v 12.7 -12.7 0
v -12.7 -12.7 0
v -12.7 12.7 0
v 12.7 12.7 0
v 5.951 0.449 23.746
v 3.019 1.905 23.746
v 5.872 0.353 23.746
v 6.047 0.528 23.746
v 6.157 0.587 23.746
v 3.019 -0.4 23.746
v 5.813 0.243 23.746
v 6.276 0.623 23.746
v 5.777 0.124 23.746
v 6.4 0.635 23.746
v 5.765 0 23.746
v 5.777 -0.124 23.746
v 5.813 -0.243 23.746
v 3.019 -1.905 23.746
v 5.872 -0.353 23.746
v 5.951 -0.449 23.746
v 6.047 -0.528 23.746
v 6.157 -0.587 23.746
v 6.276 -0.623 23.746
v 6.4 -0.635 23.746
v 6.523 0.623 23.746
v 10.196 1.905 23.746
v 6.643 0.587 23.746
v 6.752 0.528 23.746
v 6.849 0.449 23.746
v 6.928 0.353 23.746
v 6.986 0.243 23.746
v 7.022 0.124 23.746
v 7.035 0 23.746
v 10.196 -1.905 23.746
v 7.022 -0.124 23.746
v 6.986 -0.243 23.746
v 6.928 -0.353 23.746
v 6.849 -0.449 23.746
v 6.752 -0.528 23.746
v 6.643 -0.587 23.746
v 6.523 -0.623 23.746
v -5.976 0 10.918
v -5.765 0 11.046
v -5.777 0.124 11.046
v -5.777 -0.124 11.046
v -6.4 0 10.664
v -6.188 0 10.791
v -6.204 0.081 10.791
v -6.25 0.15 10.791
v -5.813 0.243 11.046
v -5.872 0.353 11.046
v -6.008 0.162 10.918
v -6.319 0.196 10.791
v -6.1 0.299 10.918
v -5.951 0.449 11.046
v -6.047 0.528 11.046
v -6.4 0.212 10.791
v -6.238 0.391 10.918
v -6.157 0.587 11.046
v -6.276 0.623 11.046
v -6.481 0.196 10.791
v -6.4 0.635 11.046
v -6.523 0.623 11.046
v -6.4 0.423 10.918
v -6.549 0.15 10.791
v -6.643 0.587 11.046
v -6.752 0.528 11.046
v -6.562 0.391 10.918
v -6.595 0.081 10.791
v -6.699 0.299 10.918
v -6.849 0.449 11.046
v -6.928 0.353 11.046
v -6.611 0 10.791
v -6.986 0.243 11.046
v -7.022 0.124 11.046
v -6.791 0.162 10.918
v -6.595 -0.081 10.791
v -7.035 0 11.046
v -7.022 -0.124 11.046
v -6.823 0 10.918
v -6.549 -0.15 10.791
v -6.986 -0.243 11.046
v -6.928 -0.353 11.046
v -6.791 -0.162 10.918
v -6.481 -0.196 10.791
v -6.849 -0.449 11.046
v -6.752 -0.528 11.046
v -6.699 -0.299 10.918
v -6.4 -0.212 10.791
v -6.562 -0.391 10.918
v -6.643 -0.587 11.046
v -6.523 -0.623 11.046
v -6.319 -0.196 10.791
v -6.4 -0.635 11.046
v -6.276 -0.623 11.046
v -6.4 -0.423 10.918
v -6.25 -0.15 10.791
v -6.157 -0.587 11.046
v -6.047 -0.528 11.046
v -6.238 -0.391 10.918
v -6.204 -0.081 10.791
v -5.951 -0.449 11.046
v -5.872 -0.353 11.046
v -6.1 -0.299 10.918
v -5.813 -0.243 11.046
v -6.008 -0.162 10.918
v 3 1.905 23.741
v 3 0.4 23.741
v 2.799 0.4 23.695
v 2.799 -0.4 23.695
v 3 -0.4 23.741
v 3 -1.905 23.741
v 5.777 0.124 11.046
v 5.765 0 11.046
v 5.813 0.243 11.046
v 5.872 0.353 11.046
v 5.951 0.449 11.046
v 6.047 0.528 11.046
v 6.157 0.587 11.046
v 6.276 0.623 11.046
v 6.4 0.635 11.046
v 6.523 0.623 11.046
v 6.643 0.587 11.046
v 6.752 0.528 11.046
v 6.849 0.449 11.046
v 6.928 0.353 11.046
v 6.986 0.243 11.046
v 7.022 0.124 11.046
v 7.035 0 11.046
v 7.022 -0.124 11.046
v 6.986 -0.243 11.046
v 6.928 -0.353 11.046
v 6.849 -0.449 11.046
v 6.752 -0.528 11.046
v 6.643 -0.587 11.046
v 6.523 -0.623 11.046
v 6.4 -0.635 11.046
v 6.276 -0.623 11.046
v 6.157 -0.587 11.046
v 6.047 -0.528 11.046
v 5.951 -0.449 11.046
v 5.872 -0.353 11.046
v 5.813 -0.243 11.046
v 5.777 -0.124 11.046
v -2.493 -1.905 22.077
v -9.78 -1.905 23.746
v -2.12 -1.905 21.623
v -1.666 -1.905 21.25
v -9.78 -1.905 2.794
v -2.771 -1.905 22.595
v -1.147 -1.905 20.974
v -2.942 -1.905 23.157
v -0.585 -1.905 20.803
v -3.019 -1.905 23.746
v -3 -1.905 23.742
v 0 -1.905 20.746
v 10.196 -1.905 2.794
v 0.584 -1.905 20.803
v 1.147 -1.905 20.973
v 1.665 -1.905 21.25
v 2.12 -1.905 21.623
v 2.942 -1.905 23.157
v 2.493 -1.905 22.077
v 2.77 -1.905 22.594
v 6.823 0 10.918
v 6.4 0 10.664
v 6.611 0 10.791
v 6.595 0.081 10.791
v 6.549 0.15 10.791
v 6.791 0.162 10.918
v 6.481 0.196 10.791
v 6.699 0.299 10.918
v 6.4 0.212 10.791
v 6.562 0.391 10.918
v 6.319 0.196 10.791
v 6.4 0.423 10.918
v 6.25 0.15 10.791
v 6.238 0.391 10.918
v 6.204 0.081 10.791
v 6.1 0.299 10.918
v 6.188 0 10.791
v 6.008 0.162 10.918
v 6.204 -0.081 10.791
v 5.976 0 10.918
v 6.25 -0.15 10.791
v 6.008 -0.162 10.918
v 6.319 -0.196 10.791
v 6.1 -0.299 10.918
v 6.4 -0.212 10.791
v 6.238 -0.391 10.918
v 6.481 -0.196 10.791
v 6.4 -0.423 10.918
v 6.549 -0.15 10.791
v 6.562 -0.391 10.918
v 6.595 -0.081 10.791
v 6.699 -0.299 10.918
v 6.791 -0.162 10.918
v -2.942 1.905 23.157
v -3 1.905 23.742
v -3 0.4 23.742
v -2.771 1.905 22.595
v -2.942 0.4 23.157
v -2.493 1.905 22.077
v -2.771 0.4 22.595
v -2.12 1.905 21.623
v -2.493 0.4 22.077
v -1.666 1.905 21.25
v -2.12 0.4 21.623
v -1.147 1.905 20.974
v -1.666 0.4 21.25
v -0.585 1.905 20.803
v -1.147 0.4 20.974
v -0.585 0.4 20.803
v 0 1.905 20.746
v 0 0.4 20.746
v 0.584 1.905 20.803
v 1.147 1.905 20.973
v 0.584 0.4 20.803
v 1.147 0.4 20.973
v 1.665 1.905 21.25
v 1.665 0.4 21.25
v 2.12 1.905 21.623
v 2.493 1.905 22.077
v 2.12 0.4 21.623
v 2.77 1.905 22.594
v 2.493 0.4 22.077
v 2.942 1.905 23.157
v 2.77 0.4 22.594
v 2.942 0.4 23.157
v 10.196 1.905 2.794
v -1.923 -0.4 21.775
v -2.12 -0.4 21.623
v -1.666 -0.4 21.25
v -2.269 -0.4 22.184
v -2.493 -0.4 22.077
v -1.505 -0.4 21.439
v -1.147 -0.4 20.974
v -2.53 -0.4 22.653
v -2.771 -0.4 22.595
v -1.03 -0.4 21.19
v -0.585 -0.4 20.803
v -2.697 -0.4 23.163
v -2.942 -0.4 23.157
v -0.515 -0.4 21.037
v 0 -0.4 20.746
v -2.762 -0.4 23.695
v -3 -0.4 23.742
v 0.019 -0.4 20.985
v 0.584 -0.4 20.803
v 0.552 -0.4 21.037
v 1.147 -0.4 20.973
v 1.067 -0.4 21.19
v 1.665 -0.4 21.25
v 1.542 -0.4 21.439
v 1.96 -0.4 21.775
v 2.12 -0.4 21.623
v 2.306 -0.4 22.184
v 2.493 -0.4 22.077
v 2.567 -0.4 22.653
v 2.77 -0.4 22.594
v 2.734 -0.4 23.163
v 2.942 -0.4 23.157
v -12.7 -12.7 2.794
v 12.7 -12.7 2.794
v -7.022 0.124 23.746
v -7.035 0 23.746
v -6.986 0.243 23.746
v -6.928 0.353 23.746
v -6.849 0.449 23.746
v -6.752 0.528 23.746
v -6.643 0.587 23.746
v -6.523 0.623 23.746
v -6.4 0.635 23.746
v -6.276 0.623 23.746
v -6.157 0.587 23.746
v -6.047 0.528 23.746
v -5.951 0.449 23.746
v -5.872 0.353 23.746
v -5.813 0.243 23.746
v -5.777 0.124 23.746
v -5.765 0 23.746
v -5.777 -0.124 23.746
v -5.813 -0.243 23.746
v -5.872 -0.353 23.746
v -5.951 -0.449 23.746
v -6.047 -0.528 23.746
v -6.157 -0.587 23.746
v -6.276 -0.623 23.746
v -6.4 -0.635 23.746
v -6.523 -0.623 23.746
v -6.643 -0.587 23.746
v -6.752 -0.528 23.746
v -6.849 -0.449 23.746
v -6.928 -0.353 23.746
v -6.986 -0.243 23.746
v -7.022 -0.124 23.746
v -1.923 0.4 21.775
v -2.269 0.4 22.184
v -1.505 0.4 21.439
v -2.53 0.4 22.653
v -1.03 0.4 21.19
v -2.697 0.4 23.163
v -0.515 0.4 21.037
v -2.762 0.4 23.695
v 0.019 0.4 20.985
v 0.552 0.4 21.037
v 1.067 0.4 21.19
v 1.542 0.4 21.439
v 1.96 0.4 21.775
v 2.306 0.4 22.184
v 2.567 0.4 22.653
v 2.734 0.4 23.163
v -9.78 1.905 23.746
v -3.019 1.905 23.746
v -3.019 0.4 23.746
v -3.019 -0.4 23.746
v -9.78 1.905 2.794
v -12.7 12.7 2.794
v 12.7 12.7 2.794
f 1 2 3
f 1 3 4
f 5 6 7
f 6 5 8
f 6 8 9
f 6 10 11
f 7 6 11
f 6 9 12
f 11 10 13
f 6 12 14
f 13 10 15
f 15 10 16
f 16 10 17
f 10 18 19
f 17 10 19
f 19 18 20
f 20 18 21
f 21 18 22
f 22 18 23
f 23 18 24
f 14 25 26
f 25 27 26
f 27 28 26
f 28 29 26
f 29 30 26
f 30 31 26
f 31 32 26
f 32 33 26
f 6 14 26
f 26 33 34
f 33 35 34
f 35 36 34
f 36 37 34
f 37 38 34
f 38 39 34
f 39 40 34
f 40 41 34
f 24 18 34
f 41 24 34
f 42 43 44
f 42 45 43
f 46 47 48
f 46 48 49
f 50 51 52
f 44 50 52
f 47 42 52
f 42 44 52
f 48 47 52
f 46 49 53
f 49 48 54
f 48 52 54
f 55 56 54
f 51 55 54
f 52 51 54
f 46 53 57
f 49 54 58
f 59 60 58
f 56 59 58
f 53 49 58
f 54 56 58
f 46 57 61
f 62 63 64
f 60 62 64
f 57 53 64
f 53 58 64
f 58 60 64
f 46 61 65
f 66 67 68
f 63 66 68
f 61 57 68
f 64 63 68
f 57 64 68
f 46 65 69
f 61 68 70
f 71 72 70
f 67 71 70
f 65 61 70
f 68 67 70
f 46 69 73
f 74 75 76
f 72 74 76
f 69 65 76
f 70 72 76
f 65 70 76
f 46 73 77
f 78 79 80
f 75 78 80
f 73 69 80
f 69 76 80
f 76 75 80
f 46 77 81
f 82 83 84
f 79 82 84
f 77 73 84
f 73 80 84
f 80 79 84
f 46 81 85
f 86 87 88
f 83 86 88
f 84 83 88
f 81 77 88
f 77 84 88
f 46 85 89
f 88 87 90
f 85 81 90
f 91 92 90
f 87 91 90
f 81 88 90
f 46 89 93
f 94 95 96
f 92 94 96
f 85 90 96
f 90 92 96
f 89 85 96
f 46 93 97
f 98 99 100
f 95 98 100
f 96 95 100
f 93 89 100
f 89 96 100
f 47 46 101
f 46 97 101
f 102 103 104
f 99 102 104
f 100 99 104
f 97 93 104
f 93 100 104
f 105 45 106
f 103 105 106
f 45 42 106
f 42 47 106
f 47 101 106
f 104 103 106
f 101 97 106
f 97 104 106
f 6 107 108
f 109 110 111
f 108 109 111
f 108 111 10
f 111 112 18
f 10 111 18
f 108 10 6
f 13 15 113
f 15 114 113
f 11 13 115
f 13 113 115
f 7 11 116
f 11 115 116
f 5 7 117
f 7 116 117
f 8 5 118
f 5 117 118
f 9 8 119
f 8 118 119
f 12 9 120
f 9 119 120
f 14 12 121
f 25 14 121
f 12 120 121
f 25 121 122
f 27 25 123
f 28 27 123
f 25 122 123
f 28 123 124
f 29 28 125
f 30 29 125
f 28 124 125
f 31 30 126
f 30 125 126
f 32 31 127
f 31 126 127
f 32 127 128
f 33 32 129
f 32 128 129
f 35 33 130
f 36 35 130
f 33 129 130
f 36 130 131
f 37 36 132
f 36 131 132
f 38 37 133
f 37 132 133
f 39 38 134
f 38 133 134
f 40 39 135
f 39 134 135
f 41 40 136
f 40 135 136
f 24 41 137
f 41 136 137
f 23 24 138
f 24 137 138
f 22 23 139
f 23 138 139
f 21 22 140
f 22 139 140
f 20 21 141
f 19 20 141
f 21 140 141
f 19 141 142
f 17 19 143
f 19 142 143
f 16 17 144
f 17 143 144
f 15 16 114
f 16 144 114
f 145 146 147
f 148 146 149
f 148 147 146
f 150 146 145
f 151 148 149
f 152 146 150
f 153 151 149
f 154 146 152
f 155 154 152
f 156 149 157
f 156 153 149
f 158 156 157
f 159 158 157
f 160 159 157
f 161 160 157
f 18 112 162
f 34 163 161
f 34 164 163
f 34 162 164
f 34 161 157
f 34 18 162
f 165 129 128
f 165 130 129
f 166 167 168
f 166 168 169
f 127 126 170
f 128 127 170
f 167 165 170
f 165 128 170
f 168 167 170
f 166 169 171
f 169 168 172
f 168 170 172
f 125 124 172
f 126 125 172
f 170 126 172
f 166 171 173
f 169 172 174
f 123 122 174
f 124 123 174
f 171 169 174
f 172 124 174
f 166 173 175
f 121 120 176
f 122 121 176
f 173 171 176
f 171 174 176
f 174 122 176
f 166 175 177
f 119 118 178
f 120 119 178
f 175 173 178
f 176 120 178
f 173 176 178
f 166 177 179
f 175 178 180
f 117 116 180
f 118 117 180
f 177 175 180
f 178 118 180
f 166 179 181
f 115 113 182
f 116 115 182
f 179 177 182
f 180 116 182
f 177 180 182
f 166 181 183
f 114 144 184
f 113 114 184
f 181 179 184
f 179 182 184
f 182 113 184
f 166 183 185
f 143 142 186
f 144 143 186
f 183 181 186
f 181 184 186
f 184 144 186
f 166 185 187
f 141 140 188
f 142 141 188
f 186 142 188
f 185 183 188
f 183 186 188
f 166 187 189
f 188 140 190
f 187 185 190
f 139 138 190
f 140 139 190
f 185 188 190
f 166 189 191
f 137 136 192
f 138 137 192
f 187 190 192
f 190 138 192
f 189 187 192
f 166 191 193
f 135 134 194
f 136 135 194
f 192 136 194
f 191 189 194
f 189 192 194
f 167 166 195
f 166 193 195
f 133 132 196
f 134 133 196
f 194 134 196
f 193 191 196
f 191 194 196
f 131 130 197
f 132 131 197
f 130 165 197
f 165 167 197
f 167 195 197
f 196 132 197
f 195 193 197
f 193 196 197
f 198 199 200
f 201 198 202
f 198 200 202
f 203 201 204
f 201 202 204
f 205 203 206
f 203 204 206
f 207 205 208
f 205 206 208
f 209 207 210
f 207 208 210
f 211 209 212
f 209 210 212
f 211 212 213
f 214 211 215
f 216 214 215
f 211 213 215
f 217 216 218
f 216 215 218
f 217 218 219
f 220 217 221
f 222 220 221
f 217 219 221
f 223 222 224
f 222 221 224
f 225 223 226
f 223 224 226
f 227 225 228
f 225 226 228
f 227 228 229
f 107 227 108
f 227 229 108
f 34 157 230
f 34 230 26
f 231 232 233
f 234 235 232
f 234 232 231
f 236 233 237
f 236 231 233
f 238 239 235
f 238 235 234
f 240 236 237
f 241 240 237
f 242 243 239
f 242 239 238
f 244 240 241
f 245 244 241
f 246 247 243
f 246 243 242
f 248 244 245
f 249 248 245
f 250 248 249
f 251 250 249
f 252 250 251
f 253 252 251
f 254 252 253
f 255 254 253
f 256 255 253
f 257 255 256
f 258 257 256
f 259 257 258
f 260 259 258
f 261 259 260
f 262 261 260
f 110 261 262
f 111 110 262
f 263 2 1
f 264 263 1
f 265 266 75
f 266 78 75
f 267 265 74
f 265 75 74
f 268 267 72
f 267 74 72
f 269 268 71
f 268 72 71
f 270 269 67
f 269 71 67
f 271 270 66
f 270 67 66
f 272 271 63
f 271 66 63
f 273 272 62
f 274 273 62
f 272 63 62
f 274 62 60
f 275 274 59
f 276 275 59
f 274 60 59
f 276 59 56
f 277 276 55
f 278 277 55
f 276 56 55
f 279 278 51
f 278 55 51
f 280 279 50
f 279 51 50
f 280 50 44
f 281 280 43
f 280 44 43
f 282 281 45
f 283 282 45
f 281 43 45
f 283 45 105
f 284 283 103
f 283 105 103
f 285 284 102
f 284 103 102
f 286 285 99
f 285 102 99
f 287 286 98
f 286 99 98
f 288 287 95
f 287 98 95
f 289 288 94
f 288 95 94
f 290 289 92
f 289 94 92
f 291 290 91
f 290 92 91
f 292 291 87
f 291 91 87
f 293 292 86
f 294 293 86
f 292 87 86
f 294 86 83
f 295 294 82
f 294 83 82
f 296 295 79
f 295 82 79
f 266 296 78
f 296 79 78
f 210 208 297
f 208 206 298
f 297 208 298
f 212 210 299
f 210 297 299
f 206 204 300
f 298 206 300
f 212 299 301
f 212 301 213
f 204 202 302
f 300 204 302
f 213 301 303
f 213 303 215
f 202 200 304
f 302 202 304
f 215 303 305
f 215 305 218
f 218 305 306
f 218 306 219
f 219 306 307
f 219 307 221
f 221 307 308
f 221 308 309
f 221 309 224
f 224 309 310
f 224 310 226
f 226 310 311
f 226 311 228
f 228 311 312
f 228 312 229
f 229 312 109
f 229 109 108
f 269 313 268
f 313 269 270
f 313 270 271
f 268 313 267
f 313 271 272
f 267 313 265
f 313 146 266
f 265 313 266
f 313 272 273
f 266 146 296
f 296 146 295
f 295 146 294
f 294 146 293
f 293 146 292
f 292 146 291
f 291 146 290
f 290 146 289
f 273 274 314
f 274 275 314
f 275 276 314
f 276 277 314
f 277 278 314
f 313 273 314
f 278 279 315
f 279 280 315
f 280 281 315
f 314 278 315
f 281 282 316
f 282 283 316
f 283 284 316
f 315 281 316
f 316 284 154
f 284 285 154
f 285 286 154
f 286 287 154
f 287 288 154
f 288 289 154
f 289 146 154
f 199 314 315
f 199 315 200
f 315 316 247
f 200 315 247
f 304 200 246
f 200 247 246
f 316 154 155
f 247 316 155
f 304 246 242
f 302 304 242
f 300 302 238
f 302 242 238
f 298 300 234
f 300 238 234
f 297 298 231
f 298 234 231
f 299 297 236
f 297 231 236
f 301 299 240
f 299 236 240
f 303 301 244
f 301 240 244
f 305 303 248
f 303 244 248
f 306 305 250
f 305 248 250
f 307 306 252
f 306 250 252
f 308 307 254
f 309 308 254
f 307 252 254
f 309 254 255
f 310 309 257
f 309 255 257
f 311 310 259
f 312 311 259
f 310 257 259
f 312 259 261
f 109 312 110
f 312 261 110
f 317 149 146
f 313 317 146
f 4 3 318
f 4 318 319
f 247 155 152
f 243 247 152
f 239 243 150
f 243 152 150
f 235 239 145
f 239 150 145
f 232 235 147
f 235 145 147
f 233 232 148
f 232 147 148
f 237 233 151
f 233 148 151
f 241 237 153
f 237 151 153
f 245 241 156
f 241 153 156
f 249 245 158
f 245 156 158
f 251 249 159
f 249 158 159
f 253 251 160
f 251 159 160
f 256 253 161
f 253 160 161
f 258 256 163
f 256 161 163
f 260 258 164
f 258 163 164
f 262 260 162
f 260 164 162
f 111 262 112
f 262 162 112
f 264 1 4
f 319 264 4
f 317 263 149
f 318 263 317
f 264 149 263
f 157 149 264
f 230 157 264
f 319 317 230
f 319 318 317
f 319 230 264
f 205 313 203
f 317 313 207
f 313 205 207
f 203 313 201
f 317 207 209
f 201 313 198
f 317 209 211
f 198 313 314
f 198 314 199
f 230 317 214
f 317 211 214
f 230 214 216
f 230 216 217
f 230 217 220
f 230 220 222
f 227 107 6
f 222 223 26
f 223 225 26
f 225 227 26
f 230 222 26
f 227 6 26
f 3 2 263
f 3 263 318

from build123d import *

# Parameters (mm, degrees)
F0_W      = 25.4
F0_H      = 25.4
F1_DEPTH  = 2.794
F2_W      = 19.9765078723
F2_H      = 23.7455442548
F3_DEPTH  = 1.905
F4_R      = 3
F5_DEPTH  = 2.6162
F6_R      = 3.0188611448
F7_DEPTH  = 0.4
F9_DEPTH  = 12.7
F11_D     = 1.27
F11_DEPTH = 12.7
F11_TIP   = 0.3815464931


with BuildPart() as f1:
    # F0 (on Top) → F1 (new body)
    with BuildSketch(Plane.XY):
        Rectangle(F0_W, F0_H)
    extrude(amount=F1_DEPTH)

    # F2 (on Front) → F3 (join, symmetric)
    with BuildSketch(Plane.XZ):
        with Locations((0.2077743411, 11.8727721274)):
            Rectangle(F2_W, F2_H)
    extrude(amount=F3_DEPTH, both=True)

    # F4 (on Front) → F5 (cut, symmetric)
    with BuildSketch(Plane.XZ):
        with Locations((0, 23.7455442548)):
            Circle(F4_R)
    extrude(amount=F5_DEPTH, both=True, mode=Mode.SUBTRACT)

    # F6 (on Front) → F7 (join, symmetric)
    with BuildSketch(Plane.XZ):
        with Locations((0, 23.7644053996)):
            Circle(F6_R)
    extrude(amount=F7_DEPTH, both=True)

    # F8 (on Front) → F9 (cut, symmetric)
    with BuildSketch(Plane.XZ):
        with BuildLine():
            Line((-3.0188022242, 23.7455442548), (-2.7621155605, 23.6954018474))
            ThreePointArc((-2.7621155605, 23.6954018474), (0.0185002573, 20.9847880645), (2.799116075, 23.6954018474))
            Line((2.799116075, 23.6954018474), (3.0188022242, 23.7455442548))
            ThreePointArc((3.0188022242, 23.7455442548), (0, 26.7832665443), (-3.0188022242, 23.7455442548))
        make_face()
    extrude(amount=F9_DEPTH, both=True, mode=Mode.SUBTRACT)

    # F11
    with Locations(Plane.XY.offset(23.7455442548)):
        with Locations((6.3995422242, 0), (-6.3995422242, 0)):
            Hole(F11_D / 2, depth=F11_DEPTH)
            with Locations((0, 0, -(F11_DEPTH + F11_TIP / 2))):  # 118° drill point
                Cone(0, F11_D / 2, F11_TIP, mode=Mode.SUBTRACT)


solid = f1.part
